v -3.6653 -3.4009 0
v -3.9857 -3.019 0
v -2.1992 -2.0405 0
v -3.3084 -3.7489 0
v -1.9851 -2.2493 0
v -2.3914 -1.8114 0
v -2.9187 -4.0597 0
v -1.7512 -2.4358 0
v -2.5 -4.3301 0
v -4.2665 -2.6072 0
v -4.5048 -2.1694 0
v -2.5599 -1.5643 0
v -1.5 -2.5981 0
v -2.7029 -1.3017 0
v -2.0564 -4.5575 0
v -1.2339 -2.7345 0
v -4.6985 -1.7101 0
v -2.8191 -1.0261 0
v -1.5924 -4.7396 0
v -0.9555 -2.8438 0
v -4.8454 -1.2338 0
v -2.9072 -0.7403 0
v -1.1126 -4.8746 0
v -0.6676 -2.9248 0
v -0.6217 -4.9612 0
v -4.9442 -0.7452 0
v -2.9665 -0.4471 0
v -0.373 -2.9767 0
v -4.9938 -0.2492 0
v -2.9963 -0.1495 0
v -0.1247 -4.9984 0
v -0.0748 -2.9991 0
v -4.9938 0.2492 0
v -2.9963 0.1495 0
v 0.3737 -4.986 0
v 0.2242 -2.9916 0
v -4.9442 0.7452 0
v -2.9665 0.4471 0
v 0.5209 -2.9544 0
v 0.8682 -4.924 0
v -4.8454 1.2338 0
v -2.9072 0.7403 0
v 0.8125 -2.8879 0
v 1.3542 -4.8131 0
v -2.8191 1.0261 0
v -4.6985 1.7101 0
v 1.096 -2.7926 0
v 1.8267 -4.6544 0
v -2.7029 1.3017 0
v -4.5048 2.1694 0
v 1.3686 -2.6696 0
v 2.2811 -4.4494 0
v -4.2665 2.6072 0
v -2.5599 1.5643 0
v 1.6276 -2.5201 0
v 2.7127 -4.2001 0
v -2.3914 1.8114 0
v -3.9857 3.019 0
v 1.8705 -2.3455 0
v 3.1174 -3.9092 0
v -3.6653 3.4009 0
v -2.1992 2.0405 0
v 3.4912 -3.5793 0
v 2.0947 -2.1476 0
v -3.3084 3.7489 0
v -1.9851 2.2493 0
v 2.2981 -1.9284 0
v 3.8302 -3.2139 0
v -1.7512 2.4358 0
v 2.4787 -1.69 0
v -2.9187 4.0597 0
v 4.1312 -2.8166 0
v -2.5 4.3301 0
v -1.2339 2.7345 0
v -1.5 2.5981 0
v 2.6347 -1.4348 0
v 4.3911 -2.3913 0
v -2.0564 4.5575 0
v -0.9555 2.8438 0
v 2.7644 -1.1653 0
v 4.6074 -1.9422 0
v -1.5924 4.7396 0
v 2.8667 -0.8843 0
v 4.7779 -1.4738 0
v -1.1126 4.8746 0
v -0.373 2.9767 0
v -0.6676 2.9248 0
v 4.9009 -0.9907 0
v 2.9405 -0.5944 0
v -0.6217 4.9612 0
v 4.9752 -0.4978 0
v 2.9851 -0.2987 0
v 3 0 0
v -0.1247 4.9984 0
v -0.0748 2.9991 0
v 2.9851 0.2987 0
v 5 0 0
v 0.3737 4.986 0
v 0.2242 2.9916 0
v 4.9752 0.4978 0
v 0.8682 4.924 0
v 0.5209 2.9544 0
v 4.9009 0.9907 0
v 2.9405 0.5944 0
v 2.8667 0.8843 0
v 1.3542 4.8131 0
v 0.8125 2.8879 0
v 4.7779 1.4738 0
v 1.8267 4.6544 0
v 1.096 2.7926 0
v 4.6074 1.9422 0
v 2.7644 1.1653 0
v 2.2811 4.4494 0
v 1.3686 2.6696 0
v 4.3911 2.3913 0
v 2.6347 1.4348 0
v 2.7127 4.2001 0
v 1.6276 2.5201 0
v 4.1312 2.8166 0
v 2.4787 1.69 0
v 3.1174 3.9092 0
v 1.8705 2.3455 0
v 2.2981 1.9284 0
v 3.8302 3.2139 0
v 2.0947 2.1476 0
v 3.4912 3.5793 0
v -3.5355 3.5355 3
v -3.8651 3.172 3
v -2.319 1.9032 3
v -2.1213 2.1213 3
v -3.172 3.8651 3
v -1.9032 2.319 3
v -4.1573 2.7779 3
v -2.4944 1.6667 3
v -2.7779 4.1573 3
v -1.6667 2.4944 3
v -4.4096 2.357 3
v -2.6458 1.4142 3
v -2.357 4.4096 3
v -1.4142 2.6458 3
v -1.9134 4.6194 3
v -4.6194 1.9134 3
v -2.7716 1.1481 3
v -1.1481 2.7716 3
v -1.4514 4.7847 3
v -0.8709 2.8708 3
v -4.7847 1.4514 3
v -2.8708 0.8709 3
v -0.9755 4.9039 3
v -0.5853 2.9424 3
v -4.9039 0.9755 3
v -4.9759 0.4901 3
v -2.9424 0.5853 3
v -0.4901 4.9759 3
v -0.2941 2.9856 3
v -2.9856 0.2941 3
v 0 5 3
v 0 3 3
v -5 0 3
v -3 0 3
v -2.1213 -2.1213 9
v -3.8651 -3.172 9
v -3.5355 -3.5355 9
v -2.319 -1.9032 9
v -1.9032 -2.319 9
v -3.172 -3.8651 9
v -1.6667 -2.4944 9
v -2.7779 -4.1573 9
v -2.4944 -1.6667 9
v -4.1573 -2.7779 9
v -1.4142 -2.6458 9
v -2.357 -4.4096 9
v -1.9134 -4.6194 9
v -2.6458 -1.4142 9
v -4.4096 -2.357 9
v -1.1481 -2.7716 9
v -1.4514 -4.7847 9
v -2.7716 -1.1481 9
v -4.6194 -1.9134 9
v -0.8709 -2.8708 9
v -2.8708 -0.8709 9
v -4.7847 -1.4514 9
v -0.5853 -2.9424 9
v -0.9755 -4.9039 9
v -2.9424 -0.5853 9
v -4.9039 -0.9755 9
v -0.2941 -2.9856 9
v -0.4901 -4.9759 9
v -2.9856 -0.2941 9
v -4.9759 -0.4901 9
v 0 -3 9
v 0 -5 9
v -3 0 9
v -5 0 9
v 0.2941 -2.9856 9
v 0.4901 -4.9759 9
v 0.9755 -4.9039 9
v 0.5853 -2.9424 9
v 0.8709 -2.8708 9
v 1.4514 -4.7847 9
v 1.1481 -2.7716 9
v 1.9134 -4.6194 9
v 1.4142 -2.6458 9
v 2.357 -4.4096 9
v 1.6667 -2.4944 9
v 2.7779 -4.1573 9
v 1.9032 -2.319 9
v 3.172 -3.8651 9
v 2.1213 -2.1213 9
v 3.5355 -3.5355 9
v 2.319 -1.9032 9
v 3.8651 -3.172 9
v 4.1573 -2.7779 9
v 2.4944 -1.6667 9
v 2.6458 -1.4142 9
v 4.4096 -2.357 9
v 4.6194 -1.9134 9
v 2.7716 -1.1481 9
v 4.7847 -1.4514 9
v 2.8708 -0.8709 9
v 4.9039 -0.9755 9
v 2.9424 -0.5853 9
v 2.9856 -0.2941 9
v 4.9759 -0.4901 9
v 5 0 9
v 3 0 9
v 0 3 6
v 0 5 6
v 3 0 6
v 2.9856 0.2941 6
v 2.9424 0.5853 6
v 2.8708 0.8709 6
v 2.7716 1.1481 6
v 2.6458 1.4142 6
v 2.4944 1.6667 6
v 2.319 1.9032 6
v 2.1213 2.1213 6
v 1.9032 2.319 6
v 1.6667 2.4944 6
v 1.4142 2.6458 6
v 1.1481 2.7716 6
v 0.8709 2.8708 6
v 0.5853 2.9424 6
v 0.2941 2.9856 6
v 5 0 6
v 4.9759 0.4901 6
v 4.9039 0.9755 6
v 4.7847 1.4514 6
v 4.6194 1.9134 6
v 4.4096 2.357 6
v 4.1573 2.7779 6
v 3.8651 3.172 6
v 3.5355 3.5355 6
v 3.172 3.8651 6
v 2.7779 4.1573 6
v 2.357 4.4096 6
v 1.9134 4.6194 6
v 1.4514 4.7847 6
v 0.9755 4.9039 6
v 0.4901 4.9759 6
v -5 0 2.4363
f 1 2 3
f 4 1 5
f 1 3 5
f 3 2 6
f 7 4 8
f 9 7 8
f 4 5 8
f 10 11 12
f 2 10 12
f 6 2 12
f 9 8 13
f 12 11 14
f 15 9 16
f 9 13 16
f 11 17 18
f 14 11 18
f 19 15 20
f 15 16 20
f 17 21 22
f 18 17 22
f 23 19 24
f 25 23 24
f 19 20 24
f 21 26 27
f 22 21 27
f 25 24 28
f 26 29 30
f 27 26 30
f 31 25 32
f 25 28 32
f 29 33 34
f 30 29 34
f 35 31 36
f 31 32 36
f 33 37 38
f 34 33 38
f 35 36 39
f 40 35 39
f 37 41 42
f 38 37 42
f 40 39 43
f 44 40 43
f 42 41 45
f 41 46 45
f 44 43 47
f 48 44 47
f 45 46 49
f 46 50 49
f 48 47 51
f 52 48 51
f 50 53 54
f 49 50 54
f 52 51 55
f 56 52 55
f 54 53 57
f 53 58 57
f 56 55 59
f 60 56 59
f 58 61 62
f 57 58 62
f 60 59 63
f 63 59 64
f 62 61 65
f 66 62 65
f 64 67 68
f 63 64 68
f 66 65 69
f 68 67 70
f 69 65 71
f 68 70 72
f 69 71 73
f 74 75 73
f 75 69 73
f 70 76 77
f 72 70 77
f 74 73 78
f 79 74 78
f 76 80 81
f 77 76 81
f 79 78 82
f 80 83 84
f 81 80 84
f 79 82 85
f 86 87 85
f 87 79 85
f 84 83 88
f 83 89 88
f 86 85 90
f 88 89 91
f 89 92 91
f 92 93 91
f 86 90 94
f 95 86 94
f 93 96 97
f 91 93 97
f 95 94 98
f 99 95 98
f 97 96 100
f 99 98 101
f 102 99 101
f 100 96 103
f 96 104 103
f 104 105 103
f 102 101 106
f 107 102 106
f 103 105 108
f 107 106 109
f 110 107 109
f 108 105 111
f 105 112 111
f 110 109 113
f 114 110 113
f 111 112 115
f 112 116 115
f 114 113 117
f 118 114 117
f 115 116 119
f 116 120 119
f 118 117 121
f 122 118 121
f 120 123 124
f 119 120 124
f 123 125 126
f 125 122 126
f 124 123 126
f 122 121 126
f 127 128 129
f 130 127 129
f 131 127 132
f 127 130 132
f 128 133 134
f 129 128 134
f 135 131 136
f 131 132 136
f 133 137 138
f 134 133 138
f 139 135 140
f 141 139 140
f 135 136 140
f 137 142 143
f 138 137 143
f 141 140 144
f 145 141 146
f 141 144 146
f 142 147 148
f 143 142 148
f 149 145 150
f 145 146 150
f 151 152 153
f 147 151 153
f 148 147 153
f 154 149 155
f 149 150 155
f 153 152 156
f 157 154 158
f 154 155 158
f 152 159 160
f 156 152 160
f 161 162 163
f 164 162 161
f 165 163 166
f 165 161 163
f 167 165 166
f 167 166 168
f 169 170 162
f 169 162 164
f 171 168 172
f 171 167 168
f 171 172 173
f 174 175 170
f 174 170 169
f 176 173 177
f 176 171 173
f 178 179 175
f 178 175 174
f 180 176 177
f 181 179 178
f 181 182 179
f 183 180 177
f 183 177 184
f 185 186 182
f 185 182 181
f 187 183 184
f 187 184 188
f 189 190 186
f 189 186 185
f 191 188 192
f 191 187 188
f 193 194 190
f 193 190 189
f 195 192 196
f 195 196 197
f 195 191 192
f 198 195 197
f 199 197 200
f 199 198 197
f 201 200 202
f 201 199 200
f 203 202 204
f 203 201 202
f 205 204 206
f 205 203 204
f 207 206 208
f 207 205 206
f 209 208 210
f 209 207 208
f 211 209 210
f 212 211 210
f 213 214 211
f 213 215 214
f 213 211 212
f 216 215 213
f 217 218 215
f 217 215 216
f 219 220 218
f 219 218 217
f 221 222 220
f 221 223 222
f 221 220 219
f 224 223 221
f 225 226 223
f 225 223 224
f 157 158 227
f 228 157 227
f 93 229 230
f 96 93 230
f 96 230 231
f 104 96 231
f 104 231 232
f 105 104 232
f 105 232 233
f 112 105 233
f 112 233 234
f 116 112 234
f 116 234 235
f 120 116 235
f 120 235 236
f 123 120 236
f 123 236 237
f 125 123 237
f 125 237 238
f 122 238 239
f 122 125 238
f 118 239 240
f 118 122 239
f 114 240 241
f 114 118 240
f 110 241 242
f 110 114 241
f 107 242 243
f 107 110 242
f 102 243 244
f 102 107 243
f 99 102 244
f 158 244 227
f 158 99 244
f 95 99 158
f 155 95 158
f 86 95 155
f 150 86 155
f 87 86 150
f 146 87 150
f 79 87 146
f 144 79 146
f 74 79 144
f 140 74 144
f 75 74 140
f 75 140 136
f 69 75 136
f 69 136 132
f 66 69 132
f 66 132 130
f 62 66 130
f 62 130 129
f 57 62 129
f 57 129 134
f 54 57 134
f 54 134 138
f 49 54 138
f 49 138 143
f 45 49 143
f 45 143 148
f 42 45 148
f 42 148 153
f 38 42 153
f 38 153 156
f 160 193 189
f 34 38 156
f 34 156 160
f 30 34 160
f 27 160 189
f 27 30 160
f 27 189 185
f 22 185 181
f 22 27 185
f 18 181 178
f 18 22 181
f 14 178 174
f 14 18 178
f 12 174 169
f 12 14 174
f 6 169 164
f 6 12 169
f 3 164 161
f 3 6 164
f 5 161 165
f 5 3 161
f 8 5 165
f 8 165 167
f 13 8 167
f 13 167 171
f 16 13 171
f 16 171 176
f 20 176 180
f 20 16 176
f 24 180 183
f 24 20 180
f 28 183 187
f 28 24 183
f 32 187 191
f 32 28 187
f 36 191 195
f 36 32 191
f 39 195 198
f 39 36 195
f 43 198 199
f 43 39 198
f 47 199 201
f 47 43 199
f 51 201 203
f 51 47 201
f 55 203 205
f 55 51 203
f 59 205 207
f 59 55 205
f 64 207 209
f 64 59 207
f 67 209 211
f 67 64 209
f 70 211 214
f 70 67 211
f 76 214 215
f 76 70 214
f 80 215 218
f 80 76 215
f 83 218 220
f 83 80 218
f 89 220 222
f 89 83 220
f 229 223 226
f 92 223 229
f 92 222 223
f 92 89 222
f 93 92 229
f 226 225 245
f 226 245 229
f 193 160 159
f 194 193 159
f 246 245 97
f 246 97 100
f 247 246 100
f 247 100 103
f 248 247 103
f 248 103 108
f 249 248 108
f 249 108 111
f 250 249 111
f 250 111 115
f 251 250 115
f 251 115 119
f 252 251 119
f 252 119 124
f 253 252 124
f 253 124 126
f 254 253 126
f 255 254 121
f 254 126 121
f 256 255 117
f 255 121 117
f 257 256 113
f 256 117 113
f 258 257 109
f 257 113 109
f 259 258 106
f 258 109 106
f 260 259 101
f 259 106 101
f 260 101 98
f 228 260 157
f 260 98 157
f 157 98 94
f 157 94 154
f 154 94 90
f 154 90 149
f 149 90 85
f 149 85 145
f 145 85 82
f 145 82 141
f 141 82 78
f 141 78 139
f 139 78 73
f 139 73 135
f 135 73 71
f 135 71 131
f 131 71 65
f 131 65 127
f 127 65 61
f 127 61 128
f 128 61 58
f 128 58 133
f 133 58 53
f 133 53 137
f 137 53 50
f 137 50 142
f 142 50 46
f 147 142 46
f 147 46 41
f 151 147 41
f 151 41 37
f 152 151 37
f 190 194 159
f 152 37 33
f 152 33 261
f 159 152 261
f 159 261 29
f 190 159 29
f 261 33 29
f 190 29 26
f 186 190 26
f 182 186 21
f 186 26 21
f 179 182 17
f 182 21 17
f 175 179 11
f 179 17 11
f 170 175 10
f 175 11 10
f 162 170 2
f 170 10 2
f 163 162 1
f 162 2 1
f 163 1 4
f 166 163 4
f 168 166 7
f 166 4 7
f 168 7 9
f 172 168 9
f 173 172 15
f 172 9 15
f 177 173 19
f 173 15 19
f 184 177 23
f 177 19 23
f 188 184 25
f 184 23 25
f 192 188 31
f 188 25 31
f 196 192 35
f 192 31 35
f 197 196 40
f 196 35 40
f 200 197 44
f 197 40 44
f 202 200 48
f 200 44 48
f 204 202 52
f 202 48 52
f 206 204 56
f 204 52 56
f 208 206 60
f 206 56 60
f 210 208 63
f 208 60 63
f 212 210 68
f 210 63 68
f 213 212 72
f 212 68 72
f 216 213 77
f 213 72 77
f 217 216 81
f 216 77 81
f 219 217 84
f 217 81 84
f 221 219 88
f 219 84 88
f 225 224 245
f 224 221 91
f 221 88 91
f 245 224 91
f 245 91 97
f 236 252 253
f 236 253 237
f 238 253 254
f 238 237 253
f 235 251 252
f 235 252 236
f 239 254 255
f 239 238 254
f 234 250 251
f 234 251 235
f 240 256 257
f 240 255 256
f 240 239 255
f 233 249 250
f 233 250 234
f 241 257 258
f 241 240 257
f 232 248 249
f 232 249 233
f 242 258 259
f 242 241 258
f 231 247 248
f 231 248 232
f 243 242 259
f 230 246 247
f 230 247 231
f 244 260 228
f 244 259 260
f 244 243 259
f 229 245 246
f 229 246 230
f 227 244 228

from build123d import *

# Parameters (mm, degrees)
SKETCH1_R           = 5
SKETCH1_R_2         = 3
BOSS_EXTRUDE1_DEPTH = 9
CUT_EXTRUDE1_DEPTH  = 9


with BuildPart() as part:
    # Sketch1 → Boss-Extrude1 (new body)
    with BuildSketch(Plane.XY):
        Circle(SKETCH1_R)
        Circle(SKETCH1_R_2, mode=Mode.SUBTRACT)
    extrude(amount=BOSS_EXTRUDE1_DEPTH)

    # Sketch2 → Cut-Extrude1 (cut)
    with BuildSketch(Plane(origin=(0, 0, 0), x_dir=(1, 0, 0), z_dir=(0, 1, 0))):
        Polygon((-5, -3), (0, -3), (0, -6), (3.187015058, -6), (6.391445499, -6), (6.391445499, -9.698491775), (-6.043137843, -9.698491775), (-6.043137843, -2.314369455), (-5, -2.436277134), align=None)
    extrude(amount=CUT_EXTRUDE1_DEPTH, mode=Mode.SUBTRACT)


solid = part.part
